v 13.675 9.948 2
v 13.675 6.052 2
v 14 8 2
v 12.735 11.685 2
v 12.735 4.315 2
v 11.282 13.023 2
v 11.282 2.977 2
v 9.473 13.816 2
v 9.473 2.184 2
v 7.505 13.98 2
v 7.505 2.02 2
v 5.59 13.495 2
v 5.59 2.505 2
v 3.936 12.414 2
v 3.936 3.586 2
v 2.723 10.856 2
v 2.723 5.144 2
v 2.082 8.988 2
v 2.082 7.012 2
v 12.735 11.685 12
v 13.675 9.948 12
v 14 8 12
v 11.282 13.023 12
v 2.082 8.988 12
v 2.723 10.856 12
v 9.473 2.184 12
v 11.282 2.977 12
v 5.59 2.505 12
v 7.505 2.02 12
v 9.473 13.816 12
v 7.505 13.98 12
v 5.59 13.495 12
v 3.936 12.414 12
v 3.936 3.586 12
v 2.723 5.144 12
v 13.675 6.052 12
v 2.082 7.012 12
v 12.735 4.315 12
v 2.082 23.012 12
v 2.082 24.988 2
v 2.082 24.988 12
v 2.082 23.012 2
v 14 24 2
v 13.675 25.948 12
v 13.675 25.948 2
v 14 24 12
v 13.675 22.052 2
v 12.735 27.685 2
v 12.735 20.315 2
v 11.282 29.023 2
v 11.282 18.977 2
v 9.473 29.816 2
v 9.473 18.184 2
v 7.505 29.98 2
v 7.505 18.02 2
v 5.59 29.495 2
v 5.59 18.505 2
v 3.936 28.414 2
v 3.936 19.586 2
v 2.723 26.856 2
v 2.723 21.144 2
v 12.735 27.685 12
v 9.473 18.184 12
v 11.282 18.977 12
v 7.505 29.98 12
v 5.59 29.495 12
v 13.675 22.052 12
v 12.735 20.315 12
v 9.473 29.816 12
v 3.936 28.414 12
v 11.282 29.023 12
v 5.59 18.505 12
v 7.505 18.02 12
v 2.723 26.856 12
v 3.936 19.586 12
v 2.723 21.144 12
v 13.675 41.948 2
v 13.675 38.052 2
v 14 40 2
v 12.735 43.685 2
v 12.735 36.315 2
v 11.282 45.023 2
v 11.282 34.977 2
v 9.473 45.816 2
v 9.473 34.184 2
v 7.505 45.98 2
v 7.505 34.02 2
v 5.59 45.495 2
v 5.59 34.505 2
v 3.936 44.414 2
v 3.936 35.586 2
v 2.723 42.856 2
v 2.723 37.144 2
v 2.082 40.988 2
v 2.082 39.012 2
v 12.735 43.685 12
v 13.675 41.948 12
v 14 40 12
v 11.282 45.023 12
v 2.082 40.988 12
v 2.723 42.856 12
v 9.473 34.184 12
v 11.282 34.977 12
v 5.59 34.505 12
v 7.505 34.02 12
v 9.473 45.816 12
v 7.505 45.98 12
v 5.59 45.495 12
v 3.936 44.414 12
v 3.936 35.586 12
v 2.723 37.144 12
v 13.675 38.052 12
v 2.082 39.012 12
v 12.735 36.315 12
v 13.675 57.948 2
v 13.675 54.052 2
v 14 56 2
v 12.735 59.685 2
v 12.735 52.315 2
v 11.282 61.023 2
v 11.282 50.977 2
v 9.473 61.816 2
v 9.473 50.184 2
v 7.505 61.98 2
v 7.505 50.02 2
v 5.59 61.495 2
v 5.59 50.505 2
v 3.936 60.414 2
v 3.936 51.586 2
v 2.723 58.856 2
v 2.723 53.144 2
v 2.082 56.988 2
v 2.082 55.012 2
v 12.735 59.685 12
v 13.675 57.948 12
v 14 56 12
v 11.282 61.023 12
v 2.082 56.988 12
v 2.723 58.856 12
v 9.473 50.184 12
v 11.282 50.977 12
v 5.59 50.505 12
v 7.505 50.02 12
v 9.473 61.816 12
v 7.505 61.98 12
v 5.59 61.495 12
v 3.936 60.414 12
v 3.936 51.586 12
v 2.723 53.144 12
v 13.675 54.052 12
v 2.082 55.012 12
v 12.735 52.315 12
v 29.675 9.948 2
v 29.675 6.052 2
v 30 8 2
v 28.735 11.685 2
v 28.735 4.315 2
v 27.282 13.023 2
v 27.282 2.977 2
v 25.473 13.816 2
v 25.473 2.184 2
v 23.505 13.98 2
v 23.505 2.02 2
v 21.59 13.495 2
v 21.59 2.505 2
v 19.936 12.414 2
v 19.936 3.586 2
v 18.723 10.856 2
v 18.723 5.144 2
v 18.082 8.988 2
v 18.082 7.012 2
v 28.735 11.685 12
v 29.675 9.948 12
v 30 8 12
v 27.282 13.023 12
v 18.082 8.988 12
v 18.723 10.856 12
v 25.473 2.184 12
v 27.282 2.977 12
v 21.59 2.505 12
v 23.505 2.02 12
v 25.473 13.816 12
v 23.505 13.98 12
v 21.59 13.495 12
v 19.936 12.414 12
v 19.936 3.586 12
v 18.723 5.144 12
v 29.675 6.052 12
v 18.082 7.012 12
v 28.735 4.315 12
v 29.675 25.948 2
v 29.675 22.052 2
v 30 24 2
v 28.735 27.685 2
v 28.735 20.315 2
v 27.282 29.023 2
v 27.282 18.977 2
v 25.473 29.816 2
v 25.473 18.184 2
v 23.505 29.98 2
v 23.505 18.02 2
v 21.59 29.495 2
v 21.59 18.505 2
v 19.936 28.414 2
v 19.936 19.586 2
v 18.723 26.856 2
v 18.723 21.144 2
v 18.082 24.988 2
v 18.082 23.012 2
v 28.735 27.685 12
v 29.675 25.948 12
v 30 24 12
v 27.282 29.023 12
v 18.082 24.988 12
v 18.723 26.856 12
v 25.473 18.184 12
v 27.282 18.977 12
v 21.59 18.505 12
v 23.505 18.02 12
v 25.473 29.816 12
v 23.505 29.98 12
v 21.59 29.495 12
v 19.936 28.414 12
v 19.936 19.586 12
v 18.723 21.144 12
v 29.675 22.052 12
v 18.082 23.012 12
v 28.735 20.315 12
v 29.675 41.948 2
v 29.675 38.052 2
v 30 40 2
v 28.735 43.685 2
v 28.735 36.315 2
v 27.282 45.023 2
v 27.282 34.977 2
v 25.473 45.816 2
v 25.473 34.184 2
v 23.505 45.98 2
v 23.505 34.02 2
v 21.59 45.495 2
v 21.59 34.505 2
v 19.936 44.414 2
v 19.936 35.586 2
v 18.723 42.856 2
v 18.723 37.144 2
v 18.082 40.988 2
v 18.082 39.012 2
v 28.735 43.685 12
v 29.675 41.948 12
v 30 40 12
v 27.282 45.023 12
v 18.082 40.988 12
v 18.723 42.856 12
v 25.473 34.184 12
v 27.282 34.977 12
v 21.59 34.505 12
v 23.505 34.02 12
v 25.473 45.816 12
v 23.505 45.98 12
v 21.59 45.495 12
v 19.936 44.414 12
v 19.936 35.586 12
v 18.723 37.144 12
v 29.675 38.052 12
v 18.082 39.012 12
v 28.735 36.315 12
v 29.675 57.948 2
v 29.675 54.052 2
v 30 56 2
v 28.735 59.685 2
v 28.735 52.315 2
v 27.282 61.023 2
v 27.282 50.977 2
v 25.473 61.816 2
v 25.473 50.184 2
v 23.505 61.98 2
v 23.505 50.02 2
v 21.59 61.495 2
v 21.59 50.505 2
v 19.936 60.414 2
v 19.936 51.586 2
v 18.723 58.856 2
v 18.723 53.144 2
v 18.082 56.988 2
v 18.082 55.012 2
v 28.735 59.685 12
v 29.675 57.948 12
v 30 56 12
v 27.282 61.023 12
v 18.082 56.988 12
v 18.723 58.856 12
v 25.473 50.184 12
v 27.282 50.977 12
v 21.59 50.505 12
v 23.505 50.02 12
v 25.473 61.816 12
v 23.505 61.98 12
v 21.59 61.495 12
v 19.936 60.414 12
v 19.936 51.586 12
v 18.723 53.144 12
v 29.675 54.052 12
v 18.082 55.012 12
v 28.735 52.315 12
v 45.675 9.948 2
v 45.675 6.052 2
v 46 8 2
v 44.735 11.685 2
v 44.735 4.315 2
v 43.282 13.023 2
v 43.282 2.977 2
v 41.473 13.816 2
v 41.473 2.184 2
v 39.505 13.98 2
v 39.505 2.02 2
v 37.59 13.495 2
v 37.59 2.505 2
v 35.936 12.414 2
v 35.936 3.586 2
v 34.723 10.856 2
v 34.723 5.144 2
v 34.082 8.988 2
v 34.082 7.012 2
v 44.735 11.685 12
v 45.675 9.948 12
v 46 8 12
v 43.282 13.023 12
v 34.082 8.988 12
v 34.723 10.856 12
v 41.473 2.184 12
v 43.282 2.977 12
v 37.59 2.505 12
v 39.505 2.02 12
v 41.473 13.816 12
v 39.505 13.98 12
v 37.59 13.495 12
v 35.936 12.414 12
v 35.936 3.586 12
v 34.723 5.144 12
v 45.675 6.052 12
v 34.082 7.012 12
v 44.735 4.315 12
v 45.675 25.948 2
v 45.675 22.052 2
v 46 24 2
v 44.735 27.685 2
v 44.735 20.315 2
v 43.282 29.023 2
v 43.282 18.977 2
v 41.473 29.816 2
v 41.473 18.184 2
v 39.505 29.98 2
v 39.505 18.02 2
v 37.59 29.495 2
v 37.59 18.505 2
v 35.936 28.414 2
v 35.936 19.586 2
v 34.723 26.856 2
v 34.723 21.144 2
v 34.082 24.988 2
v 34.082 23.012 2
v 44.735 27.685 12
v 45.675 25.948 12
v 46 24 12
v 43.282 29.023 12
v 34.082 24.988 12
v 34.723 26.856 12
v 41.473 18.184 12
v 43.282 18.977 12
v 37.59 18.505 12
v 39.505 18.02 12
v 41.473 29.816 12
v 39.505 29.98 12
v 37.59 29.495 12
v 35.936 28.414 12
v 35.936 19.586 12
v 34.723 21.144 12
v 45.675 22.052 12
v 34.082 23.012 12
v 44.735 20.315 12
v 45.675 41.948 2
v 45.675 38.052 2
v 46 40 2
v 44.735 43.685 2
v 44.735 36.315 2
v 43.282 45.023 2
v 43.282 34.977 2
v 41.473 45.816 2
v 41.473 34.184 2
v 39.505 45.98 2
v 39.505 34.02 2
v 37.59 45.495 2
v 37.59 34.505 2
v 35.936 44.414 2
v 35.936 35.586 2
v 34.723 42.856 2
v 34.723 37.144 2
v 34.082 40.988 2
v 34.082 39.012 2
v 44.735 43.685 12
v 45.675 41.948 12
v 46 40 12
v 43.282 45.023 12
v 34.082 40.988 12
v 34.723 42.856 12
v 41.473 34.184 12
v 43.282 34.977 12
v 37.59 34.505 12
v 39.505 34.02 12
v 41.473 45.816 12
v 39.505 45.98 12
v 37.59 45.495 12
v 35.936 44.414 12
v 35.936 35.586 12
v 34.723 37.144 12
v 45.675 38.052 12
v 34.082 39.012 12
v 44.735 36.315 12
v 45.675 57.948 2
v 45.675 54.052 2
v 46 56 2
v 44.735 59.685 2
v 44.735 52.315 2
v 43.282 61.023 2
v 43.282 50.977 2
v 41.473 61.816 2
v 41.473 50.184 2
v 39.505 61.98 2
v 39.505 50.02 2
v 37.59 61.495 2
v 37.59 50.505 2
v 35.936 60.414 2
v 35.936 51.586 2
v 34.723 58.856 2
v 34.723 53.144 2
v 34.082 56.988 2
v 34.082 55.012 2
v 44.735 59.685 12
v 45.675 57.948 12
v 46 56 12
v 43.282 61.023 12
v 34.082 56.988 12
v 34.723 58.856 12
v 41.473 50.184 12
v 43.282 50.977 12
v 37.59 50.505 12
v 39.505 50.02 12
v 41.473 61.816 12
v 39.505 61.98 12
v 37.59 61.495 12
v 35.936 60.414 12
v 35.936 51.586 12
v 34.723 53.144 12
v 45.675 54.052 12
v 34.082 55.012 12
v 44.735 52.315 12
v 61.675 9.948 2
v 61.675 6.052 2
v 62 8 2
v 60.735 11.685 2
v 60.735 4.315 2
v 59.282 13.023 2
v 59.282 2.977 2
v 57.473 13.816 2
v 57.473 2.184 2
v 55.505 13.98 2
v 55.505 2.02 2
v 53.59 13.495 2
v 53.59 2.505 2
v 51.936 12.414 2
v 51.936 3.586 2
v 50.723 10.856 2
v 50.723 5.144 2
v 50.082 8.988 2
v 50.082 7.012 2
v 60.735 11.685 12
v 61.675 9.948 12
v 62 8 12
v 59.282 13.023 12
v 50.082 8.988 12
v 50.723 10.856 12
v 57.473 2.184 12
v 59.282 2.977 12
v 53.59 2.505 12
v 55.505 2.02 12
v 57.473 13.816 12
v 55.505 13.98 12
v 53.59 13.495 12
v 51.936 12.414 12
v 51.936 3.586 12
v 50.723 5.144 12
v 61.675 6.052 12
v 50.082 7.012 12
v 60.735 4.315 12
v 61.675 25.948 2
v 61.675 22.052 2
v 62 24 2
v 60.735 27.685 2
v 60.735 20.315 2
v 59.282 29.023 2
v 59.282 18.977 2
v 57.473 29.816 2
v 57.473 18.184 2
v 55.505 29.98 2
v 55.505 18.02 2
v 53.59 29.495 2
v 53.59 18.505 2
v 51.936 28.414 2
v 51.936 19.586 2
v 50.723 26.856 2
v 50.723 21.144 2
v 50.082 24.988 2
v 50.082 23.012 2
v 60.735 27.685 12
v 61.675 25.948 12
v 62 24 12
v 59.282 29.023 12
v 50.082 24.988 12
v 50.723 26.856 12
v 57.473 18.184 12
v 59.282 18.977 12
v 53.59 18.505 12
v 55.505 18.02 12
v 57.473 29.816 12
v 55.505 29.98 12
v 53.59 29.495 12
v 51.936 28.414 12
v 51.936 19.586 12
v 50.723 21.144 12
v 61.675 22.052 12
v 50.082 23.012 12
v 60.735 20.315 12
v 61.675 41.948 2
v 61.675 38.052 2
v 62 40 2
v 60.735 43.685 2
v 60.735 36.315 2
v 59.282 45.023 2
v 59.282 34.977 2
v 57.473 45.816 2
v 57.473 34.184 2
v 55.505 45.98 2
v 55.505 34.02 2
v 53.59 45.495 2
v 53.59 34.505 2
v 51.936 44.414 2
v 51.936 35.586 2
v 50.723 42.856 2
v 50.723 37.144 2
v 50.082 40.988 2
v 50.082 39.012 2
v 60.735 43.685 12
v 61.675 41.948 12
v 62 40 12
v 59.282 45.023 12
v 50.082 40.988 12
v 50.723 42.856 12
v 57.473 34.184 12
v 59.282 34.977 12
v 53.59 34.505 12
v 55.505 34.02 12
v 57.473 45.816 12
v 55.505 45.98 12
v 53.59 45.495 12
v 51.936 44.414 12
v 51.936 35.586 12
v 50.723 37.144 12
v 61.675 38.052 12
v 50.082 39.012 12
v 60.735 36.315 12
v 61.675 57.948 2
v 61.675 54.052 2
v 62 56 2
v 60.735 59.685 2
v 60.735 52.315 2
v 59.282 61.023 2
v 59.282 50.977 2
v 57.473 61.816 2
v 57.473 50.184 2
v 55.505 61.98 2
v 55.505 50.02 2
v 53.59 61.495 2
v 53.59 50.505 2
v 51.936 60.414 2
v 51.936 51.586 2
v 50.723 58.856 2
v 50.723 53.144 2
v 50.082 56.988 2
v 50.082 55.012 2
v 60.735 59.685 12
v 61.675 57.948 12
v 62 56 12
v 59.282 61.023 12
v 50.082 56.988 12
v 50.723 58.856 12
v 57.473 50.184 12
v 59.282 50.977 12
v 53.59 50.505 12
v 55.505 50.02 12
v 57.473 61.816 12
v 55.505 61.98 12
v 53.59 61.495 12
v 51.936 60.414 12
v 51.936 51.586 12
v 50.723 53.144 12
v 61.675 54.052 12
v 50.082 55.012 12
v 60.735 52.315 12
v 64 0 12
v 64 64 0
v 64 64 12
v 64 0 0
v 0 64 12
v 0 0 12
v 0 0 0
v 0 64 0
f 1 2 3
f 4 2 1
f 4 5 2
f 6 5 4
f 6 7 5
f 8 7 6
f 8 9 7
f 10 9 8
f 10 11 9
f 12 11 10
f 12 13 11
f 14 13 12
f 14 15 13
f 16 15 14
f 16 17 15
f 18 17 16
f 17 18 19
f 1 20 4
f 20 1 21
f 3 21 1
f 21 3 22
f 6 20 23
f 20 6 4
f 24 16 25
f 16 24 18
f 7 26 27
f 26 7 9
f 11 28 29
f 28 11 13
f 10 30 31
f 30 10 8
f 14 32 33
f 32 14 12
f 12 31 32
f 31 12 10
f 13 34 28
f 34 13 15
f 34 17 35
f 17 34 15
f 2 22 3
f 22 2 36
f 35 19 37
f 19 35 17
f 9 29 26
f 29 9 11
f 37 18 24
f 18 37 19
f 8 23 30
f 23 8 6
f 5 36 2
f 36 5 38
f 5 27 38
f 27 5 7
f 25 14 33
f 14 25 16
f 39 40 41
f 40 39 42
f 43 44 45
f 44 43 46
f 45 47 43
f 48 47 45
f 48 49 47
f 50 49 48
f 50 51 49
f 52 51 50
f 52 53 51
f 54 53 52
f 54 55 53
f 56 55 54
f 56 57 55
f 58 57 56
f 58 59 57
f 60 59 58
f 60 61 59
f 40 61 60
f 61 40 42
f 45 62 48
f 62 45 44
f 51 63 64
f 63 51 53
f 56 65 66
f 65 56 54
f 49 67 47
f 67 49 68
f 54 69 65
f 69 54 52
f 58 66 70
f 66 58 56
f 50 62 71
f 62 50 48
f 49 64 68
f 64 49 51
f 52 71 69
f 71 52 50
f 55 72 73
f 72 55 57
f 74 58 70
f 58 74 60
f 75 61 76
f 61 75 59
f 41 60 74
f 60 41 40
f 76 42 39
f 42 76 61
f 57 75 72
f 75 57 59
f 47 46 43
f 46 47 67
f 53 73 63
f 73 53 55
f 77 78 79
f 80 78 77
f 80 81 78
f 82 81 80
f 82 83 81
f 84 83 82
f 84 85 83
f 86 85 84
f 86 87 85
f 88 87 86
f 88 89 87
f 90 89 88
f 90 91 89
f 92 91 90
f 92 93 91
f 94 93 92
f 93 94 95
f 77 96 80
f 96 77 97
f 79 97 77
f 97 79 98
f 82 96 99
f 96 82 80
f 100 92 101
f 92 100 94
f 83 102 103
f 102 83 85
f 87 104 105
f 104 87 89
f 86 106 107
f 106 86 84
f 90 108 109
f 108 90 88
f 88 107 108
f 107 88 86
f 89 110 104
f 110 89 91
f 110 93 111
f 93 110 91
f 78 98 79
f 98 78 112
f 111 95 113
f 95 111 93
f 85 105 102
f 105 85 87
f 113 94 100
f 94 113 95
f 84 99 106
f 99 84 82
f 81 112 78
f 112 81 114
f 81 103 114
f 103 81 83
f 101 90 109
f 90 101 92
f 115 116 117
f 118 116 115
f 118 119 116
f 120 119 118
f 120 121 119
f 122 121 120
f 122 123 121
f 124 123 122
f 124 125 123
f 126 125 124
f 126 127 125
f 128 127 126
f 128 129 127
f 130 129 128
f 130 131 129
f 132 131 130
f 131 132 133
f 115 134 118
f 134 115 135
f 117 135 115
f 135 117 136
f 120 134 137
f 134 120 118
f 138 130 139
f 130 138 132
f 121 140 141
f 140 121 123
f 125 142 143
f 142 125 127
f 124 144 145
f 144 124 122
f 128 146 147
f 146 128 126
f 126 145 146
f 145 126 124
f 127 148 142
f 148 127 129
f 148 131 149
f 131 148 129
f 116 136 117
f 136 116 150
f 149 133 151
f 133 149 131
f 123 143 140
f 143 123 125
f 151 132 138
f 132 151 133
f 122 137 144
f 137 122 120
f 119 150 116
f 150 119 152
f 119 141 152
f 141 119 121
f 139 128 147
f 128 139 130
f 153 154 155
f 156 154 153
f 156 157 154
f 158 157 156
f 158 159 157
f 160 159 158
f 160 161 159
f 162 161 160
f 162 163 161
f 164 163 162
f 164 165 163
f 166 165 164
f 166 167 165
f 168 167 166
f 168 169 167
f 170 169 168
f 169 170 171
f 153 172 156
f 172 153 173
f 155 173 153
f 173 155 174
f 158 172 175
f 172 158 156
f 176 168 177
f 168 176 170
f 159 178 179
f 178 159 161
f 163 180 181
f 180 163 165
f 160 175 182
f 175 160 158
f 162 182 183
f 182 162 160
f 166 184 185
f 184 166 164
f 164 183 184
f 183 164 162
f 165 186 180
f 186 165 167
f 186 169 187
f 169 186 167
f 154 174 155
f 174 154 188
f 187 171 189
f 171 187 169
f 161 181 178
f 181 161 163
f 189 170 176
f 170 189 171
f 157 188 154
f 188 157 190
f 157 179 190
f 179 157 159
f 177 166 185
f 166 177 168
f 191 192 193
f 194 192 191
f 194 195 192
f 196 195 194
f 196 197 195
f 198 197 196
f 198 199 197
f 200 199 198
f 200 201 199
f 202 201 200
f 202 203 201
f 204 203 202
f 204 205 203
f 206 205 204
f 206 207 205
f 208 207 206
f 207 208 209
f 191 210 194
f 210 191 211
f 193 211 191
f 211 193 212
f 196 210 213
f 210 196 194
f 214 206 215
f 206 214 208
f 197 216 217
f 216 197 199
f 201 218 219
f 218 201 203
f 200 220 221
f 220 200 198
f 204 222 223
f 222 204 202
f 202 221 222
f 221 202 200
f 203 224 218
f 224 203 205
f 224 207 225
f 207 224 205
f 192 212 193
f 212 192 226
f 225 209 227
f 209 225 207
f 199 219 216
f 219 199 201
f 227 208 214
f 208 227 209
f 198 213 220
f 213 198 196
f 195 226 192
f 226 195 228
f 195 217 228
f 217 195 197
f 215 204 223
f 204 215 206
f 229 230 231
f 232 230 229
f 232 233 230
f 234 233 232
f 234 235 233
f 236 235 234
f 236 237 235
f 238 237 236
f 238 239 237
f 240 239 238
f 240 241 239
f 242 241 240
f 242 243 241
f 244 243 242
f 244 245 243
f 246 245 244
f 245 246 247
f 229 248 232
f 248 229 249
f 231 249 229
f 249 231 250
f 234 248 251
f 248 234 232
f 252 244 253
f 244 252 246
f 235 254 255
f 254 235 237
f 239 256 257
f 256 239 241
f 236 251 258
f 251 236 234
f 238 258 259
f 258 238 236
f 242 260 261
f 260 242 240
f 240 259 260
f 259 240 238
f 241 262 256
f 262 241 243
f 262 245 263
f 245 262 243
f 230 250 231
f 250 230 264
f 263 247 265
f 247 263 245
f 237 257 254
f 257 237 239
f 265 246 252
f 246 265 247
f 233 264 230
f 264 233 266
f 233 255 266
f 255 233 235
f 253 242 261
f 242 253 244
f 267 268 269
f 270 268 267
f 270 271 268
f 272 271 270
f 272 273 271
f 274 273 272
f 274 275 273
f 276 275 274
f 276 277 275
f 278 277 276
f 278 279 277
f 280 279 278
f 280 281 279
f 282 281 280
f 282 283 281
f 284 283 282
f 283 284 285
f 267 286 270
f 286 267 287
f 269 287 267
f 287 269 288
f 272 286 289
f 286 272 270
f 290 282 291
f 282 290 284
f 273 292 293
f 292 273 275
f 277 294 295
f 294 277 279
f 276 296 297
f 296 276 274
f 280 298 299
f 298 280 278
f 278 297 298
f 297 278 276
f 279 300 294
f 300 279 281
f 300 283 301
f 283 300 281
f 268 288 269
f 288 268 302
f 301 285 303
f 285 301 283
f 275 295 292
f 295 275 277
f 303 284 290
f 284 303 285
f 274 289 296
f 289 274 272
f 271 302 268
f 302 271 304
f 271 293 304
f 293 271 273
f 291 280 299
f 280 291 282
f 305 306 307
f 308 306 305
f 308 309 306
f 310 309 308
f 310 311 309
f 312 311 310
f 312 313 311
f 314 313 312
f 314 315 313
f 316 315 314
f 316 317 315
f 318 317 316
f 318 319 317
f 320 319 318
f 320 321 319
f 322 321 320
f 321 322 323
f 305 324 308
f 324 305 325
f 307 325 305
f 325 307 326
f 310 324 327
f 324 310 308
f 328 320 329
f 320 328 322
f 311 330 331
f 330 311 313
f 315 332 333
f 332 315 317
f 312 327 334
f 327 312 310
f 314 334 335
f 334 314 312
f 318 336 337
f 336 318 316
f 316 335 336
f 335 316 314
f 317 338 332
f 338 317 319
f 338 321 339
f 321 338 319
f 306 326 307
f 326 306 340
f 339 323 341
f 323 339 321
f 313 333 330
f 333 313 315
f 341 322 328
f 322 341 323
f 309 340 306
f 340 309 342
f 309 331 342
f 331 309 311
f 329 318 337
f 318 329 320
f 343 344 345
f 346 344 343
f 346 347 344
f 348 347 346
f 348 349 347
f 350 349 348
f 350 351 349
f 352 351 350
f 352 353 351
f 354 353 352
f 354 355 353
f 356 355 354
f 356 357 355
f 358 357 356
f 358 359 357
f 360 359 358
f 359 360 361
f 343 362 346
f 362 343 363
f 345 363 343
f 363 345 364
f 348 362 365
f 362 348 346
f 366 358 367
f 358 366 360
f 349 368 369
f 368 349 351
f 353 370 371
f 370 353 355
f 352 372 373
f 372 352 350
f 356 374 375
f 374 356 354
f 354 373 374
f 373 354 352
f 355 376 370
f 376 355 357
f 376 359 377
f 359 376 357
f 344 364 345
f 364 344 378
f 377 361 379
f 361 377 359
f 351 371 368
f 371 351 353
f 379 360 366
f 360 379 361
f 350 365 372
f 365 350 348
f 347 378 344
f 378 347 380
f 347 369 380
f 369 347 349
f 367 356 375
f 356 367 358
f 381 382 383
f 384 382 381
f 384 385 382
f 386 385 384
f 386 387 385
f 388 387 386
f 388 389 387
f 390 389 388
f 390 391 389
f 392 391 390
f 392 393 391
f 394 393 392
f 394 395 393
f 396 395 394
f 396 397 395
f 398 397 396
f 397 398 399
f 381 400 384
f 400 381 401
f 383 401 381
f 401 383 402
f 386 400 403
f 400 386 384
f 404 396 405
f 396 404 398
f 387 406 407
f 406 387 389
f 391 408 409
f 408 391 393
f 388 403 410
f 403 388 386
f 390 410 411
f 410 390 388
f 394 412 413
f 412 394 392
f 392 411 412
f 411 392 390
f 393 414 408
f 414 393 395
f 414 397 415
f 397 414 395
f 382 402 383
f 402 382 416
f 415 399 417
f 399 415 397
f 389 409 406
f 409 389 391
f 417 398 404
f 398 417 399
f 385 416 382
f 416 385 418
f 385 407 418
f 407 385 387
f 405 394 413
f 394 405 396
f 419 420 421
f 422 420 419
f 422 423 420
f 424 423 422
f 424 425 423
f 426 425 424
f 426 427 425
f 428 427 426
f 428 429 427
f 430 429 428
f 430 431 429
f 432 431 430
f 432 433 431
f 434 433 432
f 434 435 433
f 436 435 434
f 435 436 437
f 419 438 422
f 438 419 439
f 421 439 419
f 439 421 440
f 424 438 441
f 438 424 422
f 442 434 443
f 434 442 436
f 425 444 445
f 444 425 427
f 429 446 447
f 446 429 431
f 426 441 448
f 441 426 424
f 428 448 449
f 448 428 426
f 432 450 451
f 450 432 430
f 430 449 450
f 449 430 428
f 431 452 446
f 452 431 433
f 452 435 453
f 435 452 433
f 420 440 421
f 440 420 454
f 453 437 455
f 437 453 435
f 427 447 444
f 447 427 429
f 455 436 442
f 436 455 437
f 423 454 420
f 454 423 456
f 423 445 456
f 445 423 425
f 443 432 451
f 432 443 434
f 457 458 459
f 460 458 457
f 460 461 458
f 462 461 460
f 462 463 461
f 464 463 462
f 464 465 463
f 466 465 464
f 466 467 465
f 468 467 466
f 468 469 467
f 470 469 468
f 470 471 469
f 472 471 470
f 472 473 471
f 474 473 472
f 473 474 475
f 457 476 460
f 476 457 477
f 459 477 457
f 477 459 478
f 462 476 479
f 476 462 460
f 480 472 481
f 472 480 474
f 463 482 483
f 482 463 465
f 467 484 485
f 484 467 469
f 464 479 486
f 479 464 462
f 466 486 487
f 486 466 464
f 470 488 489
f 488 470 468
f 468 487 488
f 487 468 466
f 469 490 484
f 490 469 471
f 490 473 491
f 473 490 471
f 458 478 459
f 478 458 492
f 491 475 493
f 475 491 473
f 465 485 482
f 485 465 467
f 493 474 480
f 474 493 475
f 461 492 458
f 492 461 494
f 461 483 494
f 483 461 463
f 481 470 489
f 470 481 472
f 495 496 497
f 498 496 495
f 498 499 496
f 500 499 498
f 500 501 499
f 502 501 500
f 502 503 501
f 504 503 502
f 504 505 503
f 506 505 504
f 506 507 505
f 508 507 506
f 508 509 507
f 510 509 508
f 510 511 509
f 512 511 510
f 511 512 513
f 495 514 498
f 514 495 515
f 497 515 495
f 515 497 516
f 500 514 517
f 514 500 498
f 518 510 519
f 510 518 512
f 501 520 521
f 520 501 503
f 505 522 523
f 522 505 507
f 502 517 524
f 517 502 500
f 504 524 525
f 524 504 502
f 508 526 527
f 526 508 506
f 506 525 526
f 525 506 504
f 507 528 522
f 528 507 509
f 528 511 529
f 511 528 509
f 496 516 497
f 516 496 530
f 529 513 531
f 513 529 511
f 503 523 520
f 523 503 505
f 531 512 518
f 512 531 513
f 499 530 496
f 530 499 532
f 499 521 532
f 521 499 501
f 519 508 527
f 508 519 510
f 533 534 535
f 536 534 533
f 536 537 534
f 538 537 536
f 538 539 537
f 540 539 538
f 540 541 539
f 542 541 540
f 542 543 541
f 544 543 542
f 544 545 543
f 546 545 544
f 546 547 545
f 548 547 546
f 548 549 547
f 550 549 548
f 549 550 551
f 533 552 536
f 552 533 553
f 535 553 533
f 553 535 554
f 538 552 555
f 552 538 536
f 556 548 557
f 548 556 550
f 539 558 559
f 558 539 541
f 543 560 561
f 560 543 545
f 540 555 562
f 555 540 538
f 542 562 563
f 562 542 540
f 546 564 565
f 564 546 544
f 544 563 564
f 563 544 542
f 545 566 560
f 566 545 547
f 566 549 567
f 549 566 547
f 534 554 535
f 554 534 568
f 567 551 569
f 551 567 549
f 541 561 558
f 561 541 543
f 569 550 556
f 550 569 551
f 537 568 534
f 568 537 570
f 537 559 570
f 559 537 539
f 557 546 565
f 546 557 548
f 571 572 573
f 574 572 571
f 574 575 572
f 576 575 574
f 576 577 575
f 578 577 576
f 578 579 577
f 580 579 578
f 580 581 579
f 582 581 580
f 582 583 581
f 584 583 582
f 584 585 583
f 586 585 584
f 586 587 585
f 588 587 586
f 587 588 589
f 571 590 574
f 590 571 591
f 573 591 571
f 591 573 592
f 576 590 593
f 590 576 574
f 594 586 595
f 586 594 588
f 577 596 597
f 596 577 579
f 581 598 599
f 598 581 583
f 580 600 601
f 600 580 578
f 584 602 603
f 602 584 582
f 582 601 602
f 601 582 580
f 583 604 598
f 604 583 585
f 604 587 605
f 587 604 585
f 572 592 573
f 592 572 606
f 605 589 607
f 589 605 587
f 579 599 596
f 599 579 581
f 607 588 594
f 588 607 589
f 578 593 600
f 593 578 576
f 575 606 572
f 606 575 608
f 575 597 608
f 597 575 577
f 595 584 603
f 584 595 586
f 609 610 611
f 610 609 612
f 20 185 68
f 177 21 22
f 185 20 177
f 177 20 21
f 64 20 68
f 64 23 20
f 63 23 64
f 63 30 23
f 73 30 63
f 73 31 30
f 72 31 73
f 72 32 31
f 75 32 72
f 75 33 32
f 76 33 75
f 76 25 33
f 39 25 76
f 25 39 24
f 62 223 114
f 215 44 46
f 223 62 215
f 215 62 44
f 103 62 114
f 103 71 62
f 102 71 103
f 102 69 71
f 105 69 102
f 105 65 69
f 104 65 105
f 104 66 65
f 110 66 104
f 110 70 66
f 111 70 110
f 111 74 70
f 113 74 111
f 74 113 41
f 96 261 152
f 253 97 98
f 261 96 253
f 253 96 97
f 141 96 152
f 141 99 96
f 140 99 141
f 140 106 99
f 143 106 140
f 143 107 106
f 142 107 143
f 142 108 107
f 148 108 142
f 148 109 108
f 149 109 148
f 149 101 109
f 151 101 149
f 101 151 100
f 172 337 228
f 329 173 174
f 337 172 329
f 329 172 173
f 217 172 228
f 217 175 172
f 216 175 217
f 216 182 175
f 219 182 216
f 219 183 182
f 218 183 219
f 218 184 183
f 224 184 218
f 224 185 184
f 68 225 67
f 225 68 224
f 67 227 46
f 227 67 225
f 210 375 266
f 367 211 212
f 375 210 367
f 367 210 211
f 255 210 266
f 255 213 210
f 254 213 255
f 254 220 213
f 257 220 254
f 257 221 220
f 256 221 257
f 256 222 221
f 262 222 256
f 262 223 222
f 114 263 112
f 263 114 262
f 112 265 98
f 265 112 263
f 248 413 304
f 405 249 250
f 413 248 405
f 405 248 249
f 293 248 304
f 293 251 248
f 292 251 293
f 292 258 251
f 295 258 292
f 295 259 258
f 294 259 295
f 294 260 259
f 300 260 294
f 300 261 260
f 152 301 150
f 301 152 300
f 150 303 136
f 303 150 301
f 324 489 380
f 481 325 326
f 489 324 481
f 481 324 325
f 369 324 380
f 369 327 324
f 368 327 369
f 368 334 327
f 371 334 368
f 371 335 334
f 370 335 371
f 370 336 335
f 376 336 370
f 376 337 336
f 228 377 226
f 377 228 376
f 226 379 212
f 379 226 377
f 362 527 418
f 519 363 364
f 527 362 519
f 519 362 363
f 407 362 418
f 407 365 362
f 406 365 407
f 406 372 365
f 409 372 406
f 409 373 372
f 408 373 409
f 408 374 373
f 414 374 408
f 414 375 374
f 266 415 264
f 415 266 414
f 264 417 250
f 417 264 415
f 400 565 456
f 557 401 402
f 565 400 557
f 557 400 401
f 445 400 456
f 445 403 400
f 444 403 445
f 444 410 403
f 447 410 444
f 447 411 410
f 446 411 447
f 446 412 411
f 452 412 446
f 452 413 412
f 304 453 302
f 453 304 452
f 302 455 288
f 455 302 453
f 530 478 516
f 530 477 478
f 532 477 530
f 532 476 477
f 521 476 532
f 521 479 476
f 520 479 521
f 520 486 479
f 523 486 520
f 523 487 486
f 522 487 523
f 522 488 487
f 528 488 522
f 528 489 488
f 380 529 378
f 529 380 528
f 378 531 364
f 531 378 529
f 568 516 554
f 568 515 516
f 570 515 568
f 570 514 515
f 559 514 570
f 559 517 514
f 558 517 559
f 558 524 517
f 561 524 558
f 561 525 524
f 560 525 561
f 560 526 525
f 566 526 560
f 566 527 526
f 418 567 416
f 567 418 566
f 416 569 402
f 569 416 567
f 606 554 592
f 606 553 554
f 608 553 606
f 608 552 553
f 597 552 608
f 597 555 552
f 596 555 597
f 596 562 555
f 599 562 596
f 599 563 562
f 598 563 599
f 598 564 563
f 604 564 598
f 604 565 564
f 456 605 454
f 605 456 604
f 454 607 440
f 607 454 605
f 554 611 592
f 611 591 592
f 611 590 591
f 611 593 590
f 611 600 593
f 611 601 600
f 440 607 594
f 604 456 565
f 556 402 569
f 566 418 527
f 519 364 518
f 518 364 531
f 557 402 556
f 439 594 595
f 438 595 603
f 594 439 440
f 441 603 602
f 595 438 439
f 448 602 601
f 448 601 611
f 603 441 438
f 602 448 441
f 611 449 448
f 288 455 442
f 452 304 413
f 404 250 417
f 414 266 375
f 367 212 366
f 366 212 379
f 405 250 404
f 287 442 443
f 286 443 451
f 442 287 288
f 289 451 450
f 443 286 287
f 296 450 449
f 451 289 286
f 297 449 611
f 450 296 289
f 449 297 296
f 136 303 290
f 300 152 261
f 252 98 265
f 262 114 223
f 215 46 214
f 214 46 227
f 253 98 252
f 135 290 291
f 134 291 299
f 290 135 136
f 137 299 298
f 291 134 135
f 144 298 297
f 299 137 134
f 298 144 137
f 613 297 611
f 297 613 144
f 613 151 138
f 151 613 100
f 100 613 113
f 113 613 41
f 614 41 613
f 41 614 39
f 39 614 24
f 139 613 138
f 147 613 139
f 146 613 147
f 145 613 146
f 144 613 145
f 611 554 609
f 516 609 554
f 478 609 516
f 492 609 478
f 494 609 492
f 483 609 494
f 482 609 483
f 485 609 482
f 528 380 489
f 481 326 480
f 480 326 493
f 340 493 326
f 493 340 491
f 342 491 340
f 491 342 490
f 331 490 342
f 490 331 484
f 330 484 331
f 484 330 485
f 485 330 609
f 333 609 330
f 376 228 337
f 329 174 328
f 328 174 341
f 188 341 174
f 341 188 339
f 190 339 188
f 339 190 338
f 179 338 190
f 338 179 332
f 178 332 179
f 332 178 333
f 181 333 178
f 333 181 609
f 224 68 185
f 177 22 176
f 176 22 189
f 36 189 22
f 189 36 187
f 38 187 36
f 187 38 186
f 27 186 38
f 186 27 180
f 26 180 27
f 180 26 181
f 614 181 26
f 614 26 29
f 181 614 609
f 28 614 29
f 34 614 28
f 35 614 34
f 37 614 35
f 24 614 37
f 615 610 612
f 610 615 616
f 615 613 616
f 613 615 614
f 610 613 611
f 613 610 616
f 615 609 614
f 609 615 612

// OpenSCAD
difference() {
	cube(size = [64,64,12],
	center = false);
	for ( x = [8 : 16 : 64] )
		for (y = [ 8 : 16 : 64] )
			translate (v = [x,y,2])
				cylinder (h = 15, r = 6, center = false);
}
